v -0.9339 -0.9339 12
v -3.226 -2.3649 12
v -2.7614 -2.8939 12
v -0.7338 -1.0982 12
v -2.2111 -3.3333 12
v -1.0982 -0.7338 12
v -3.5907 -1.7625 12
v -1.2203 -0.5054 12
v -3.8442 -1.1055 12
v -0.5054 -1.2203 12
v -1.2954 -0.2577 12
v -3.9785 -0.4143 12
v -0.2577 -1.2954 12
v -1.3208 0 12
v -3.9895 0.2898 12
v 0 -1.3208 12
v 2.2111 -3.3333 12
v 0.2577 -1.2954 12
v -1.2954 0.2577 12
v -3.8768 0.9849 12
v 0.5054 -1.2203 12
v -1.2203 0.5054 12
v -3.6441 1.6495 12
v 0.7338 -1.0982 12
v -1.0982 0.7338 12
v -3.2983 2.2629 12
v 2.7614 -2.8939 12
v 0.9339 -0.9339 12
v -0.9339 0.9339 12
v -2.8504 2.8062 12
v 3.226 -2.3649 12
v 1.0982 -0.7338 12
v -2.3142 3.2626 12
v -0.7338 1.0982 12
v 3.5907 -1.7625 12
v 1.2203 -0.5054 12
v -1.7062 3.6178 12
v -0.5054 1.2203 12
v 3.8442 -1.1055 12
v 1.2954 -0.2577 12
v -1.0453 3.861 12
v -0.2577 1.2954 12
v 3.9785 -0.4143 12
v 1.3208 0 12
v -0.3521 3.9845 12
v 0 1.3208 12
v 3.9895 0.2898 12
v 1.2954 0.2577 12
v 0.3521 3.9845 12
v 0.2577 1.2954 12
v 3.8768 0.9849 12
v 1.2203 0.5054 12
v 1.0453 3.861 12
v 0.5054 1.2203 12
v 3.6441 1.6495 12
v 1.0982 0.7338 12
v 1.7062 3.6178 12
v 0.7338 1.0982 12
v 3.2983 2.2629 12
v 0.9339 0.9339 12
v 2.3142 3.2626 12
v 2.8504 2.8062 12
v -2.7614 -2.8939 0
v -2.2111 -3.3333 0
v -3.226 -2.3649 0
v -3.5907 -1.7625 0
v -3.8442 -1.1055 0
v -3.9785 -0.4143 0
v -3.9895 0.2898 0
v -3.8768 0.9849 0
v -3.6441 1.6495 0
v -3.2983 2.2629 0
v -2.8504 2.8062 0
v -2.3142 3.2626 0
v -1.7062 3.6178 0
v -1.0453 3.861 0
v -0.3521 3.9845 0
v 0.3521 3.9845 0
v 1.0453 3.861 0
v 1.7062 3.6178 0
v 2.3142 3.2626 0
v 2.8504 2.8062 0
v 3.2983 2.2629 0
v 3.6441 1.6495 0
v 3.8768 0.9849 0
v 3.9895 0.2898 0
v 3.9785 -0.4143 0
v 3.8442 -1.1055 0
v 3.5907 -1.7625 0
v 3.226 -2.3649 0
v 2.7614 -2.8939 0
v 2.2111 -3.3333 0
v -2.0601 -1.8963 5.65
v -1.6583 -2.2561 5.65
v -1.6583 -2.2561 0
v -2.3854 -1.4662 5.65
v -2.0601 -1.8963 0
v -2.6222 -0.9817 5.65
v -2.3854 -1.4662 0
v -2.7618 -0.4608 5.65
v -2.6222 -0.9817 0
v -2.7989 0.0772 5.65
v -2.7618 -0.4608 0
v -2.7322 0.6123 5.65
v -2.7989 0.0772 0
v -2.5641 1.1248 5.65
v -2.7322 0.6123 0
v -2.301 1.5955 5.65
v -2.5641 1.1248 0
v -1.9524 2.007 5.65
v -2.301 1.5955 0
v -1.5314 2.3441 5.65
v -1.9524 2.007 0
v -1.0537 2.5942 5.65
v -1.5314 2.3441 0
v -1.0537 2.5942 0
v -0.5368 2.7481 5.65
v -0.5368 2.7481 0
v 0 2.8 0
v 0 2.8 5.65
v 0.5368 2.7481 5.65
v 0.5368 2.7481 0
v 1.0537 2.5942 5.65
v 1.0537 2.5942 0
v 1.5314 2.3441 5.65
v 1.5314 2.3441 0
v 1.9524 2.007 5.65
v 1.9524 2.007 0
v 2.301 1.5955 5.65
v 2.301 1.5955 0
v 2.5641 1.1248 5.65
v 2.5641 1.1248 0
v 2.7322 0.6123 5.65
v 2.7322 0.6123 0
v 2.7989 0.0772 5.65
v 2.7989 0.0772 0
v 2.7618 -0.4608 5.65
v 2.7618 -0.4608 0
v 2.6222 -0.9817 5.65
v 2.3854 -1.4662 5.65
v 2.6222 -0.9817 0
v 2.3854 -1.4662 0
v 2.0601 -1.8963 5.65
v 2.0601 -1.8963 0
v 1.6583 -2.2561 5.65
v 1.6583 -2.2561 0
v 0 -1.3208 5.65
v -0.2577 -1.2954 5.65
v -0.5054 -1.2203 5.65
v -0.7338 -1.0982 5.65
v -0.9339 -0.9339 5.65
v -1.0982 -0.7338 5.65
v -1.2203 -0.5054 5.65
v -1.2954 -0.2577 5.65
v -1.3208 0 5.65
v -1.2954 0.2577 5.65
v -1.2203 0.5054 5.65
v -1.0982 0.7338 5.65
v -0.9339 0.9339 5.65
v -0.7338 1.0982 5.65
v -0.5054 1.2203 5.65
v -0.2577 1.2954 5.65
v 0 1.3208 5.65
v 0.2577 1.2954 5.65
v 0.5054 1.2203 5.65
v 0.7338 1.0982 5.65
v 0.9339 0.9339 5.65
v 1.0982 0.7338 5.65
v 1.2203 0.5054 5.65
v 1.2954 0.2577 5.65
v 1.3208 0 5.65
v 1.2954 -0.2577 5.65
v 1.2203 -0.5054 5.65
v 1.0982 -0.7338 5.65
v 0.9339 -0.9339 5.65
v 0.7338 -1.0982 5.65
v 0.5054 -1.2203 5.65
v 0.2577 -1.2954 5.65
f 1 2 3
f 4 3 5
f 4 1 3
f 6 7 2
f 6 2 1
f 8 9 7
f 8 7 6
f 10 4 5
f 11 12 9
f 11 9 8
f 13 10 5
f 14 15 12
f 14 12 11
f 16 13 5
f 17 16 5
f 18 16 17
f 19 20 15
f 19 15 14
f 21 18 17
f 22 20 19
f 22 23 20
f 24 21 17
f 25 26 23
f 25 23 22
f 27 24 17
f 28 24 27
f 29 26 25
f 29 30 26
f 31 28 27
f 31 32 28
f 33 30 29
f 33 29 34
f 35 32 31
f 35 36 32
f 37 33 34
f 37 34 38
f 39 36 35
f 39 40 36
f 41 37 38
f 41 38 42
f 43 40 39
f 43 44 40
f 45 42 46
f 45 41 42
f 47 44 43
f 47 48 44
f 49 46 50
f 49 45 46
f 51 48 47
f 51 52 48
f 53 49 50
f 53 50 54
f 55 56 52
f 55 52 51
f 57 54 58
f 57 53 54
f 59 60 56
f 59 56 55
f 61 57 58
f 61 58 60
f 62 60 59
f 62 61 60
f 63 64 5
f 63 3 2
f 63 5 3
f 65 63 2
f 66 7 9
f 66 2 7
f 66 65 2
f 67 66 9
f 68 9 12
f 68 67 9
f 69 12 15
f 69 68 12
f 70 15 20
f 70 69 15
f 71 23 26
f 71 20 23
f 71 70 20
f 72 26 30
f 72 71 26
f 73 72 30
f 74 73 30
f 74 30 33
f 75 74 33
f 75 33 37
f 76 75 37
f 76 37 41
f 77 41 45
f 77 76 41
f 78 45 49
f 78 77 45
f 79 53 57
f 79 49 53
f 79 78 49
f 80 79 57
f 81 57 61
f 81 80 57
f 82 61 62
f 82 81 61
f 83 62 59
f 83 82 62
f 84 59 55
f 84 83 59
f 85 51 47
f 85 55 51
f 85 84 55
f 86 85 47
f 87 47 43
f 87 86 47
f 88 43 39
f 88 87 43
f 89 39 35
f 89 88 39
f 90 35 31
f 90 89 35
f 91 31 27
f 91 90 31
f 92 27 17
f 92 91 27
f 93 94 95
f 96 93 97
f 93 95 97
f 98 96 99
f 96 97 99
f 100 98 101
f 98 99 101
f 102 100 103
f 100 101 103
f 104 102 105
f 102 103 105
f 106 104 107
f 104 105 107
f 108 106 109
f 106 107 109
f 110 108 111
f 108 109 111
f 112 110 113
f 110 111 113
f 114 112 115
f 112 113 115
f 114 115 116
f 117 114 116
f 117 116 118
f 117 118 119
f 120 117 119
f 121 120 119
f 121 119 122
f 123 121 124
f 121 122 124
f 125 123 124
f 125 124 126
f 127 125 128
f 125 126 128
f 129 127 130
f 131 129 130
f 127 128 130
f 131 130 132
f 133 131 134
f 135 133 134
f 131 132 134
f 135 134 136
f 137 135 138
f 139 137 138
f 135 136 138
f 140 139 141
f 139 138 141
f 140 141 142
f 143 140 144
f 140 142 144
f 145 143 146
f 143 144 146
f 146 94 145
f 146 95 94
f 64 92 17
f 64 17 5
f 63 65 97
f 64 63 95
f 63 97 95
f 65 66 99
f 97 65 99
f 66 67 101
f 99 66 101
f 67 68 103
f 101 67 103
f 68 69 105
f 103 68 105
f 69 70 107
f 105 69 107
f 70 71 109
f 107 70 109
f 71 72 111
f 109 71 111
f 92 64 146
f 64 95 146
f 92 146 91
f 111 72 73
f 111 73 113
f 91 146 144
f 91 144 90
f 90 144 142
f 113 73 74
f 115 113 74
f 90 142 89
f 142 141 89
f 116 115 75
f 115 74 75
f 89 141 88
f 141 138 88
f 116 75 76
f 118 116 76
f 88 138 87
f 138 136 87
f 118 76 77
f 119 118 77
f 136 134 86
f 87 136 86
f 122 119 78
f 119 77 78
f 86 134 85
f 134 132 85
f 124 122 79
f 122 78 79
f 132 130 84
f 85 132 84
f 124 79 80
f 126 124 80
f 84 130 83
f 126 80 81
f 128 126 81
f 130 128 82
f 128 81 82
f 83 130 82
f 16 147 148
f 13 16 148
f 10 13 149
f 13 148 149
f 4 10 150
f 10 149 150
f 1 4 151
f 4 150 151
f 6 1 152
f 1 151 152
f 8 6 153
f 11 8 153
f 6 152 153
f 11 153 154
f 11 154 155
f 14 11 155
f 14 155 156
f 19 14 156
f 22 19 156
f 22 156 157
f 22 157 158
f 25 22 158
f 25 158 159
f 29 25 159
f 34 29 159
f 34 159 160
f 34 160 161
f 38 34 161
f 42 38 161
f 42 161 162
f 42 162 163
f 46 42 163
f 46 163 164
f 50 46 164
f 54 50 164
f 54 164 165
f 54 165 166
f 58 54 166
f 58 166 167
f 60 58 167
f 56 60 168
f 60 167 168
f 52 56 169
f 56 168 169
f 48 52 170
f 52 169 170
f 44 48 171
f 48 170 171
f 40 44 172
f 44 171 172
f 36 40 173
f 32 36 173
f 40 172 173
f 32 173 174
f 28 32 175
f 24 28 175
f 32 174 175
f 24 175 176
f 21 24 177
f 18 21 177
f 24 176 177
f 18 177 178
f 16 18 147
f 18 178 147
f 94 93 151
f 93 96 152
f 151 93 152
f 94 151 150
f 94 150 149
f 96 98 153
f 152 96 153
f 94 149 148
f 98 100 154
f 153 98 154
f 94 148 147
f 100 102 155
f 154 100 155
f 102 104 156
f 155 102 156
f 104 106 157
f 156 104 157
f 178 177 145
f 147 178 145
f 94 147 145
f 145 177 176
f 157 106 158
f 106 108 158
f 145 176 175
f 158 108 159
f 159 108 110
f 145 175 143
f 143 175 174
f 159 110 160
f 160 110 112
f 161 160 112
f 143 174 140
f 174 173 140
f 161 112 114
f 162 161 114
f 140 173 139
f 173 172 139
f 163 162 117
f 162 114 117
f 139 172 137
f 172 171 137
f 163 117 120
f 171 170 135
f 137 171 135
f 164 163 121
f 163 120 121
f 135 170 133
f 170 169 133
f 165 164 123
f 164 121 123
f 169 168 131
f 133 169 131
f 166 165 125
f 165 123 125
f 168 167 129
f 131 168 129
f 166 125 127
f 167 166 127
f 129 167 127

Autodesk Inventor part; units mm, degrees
ref_plane "YZ Plane" through (0, 0, 0) normal (1, 0, 0) x (0, 1, 0)
ref_plane "XZ Plane" through (0, 0, 0) normal (0, 1, 0) x (-1, 0, 0)
ref_plane "XY Plane" through (0, 0, 0) normal (0, 0, 1) x (1, 0, 0)
sketch "Base" plane through (0, 0, 0) normal (0, 0, 1) x (1, 0, 0)
  line L0 (-1.6583, -2.2561) -> (1.6583, -2.2561)
  arc A0 (1.6583, -2.2561) -> (-1.6583, -2.2561) centre (0, 0) ccw
  arc A1 (2.2111, -3.3333) -> (-2.2111, -3.3333) centre (0, 0) ccw
  line L1 (2.2111, -3.3333) -> (-2.2111, -3.3333)
  line L2 (-5.6, 0) -> (5.6, 0) construction
  dimension "d1" = 2.8
  dimension "d2" = 3.3166
  dimension "d22" = 4
  dimension "d23" = 3.3333
extrude "BaseFeature" add sketch "Base" along normal blind 12
sketch "Mount" plane through (0, 0, 12) normal (0, 0, 1) x (1, 0, 0)
  arc A0 (2.2111, -3.3333) -> (-2.2111, -3.3333) centre (0, 0) ccw projected
  line L0 (-2.2111, -3.3333) -> (2.2111, -3.3333) projected
extrude "MountFeature" add sketch "Mount" against normal blind 6.35
sketch "MountHole" plane through (0, 0, 12) normal (0, 0, 1) x (1, 0, 0)
  point P0 (0, 0)
hole "MountHoleFeature" at (0, 0, 12) direction (0, 0, -1) diameter 2.6416 end through all thread size "6-32 UNC" class "2B" standard "ANSI Unified Screw Threads"
properties part number "ShaftD6Female-632Female"
